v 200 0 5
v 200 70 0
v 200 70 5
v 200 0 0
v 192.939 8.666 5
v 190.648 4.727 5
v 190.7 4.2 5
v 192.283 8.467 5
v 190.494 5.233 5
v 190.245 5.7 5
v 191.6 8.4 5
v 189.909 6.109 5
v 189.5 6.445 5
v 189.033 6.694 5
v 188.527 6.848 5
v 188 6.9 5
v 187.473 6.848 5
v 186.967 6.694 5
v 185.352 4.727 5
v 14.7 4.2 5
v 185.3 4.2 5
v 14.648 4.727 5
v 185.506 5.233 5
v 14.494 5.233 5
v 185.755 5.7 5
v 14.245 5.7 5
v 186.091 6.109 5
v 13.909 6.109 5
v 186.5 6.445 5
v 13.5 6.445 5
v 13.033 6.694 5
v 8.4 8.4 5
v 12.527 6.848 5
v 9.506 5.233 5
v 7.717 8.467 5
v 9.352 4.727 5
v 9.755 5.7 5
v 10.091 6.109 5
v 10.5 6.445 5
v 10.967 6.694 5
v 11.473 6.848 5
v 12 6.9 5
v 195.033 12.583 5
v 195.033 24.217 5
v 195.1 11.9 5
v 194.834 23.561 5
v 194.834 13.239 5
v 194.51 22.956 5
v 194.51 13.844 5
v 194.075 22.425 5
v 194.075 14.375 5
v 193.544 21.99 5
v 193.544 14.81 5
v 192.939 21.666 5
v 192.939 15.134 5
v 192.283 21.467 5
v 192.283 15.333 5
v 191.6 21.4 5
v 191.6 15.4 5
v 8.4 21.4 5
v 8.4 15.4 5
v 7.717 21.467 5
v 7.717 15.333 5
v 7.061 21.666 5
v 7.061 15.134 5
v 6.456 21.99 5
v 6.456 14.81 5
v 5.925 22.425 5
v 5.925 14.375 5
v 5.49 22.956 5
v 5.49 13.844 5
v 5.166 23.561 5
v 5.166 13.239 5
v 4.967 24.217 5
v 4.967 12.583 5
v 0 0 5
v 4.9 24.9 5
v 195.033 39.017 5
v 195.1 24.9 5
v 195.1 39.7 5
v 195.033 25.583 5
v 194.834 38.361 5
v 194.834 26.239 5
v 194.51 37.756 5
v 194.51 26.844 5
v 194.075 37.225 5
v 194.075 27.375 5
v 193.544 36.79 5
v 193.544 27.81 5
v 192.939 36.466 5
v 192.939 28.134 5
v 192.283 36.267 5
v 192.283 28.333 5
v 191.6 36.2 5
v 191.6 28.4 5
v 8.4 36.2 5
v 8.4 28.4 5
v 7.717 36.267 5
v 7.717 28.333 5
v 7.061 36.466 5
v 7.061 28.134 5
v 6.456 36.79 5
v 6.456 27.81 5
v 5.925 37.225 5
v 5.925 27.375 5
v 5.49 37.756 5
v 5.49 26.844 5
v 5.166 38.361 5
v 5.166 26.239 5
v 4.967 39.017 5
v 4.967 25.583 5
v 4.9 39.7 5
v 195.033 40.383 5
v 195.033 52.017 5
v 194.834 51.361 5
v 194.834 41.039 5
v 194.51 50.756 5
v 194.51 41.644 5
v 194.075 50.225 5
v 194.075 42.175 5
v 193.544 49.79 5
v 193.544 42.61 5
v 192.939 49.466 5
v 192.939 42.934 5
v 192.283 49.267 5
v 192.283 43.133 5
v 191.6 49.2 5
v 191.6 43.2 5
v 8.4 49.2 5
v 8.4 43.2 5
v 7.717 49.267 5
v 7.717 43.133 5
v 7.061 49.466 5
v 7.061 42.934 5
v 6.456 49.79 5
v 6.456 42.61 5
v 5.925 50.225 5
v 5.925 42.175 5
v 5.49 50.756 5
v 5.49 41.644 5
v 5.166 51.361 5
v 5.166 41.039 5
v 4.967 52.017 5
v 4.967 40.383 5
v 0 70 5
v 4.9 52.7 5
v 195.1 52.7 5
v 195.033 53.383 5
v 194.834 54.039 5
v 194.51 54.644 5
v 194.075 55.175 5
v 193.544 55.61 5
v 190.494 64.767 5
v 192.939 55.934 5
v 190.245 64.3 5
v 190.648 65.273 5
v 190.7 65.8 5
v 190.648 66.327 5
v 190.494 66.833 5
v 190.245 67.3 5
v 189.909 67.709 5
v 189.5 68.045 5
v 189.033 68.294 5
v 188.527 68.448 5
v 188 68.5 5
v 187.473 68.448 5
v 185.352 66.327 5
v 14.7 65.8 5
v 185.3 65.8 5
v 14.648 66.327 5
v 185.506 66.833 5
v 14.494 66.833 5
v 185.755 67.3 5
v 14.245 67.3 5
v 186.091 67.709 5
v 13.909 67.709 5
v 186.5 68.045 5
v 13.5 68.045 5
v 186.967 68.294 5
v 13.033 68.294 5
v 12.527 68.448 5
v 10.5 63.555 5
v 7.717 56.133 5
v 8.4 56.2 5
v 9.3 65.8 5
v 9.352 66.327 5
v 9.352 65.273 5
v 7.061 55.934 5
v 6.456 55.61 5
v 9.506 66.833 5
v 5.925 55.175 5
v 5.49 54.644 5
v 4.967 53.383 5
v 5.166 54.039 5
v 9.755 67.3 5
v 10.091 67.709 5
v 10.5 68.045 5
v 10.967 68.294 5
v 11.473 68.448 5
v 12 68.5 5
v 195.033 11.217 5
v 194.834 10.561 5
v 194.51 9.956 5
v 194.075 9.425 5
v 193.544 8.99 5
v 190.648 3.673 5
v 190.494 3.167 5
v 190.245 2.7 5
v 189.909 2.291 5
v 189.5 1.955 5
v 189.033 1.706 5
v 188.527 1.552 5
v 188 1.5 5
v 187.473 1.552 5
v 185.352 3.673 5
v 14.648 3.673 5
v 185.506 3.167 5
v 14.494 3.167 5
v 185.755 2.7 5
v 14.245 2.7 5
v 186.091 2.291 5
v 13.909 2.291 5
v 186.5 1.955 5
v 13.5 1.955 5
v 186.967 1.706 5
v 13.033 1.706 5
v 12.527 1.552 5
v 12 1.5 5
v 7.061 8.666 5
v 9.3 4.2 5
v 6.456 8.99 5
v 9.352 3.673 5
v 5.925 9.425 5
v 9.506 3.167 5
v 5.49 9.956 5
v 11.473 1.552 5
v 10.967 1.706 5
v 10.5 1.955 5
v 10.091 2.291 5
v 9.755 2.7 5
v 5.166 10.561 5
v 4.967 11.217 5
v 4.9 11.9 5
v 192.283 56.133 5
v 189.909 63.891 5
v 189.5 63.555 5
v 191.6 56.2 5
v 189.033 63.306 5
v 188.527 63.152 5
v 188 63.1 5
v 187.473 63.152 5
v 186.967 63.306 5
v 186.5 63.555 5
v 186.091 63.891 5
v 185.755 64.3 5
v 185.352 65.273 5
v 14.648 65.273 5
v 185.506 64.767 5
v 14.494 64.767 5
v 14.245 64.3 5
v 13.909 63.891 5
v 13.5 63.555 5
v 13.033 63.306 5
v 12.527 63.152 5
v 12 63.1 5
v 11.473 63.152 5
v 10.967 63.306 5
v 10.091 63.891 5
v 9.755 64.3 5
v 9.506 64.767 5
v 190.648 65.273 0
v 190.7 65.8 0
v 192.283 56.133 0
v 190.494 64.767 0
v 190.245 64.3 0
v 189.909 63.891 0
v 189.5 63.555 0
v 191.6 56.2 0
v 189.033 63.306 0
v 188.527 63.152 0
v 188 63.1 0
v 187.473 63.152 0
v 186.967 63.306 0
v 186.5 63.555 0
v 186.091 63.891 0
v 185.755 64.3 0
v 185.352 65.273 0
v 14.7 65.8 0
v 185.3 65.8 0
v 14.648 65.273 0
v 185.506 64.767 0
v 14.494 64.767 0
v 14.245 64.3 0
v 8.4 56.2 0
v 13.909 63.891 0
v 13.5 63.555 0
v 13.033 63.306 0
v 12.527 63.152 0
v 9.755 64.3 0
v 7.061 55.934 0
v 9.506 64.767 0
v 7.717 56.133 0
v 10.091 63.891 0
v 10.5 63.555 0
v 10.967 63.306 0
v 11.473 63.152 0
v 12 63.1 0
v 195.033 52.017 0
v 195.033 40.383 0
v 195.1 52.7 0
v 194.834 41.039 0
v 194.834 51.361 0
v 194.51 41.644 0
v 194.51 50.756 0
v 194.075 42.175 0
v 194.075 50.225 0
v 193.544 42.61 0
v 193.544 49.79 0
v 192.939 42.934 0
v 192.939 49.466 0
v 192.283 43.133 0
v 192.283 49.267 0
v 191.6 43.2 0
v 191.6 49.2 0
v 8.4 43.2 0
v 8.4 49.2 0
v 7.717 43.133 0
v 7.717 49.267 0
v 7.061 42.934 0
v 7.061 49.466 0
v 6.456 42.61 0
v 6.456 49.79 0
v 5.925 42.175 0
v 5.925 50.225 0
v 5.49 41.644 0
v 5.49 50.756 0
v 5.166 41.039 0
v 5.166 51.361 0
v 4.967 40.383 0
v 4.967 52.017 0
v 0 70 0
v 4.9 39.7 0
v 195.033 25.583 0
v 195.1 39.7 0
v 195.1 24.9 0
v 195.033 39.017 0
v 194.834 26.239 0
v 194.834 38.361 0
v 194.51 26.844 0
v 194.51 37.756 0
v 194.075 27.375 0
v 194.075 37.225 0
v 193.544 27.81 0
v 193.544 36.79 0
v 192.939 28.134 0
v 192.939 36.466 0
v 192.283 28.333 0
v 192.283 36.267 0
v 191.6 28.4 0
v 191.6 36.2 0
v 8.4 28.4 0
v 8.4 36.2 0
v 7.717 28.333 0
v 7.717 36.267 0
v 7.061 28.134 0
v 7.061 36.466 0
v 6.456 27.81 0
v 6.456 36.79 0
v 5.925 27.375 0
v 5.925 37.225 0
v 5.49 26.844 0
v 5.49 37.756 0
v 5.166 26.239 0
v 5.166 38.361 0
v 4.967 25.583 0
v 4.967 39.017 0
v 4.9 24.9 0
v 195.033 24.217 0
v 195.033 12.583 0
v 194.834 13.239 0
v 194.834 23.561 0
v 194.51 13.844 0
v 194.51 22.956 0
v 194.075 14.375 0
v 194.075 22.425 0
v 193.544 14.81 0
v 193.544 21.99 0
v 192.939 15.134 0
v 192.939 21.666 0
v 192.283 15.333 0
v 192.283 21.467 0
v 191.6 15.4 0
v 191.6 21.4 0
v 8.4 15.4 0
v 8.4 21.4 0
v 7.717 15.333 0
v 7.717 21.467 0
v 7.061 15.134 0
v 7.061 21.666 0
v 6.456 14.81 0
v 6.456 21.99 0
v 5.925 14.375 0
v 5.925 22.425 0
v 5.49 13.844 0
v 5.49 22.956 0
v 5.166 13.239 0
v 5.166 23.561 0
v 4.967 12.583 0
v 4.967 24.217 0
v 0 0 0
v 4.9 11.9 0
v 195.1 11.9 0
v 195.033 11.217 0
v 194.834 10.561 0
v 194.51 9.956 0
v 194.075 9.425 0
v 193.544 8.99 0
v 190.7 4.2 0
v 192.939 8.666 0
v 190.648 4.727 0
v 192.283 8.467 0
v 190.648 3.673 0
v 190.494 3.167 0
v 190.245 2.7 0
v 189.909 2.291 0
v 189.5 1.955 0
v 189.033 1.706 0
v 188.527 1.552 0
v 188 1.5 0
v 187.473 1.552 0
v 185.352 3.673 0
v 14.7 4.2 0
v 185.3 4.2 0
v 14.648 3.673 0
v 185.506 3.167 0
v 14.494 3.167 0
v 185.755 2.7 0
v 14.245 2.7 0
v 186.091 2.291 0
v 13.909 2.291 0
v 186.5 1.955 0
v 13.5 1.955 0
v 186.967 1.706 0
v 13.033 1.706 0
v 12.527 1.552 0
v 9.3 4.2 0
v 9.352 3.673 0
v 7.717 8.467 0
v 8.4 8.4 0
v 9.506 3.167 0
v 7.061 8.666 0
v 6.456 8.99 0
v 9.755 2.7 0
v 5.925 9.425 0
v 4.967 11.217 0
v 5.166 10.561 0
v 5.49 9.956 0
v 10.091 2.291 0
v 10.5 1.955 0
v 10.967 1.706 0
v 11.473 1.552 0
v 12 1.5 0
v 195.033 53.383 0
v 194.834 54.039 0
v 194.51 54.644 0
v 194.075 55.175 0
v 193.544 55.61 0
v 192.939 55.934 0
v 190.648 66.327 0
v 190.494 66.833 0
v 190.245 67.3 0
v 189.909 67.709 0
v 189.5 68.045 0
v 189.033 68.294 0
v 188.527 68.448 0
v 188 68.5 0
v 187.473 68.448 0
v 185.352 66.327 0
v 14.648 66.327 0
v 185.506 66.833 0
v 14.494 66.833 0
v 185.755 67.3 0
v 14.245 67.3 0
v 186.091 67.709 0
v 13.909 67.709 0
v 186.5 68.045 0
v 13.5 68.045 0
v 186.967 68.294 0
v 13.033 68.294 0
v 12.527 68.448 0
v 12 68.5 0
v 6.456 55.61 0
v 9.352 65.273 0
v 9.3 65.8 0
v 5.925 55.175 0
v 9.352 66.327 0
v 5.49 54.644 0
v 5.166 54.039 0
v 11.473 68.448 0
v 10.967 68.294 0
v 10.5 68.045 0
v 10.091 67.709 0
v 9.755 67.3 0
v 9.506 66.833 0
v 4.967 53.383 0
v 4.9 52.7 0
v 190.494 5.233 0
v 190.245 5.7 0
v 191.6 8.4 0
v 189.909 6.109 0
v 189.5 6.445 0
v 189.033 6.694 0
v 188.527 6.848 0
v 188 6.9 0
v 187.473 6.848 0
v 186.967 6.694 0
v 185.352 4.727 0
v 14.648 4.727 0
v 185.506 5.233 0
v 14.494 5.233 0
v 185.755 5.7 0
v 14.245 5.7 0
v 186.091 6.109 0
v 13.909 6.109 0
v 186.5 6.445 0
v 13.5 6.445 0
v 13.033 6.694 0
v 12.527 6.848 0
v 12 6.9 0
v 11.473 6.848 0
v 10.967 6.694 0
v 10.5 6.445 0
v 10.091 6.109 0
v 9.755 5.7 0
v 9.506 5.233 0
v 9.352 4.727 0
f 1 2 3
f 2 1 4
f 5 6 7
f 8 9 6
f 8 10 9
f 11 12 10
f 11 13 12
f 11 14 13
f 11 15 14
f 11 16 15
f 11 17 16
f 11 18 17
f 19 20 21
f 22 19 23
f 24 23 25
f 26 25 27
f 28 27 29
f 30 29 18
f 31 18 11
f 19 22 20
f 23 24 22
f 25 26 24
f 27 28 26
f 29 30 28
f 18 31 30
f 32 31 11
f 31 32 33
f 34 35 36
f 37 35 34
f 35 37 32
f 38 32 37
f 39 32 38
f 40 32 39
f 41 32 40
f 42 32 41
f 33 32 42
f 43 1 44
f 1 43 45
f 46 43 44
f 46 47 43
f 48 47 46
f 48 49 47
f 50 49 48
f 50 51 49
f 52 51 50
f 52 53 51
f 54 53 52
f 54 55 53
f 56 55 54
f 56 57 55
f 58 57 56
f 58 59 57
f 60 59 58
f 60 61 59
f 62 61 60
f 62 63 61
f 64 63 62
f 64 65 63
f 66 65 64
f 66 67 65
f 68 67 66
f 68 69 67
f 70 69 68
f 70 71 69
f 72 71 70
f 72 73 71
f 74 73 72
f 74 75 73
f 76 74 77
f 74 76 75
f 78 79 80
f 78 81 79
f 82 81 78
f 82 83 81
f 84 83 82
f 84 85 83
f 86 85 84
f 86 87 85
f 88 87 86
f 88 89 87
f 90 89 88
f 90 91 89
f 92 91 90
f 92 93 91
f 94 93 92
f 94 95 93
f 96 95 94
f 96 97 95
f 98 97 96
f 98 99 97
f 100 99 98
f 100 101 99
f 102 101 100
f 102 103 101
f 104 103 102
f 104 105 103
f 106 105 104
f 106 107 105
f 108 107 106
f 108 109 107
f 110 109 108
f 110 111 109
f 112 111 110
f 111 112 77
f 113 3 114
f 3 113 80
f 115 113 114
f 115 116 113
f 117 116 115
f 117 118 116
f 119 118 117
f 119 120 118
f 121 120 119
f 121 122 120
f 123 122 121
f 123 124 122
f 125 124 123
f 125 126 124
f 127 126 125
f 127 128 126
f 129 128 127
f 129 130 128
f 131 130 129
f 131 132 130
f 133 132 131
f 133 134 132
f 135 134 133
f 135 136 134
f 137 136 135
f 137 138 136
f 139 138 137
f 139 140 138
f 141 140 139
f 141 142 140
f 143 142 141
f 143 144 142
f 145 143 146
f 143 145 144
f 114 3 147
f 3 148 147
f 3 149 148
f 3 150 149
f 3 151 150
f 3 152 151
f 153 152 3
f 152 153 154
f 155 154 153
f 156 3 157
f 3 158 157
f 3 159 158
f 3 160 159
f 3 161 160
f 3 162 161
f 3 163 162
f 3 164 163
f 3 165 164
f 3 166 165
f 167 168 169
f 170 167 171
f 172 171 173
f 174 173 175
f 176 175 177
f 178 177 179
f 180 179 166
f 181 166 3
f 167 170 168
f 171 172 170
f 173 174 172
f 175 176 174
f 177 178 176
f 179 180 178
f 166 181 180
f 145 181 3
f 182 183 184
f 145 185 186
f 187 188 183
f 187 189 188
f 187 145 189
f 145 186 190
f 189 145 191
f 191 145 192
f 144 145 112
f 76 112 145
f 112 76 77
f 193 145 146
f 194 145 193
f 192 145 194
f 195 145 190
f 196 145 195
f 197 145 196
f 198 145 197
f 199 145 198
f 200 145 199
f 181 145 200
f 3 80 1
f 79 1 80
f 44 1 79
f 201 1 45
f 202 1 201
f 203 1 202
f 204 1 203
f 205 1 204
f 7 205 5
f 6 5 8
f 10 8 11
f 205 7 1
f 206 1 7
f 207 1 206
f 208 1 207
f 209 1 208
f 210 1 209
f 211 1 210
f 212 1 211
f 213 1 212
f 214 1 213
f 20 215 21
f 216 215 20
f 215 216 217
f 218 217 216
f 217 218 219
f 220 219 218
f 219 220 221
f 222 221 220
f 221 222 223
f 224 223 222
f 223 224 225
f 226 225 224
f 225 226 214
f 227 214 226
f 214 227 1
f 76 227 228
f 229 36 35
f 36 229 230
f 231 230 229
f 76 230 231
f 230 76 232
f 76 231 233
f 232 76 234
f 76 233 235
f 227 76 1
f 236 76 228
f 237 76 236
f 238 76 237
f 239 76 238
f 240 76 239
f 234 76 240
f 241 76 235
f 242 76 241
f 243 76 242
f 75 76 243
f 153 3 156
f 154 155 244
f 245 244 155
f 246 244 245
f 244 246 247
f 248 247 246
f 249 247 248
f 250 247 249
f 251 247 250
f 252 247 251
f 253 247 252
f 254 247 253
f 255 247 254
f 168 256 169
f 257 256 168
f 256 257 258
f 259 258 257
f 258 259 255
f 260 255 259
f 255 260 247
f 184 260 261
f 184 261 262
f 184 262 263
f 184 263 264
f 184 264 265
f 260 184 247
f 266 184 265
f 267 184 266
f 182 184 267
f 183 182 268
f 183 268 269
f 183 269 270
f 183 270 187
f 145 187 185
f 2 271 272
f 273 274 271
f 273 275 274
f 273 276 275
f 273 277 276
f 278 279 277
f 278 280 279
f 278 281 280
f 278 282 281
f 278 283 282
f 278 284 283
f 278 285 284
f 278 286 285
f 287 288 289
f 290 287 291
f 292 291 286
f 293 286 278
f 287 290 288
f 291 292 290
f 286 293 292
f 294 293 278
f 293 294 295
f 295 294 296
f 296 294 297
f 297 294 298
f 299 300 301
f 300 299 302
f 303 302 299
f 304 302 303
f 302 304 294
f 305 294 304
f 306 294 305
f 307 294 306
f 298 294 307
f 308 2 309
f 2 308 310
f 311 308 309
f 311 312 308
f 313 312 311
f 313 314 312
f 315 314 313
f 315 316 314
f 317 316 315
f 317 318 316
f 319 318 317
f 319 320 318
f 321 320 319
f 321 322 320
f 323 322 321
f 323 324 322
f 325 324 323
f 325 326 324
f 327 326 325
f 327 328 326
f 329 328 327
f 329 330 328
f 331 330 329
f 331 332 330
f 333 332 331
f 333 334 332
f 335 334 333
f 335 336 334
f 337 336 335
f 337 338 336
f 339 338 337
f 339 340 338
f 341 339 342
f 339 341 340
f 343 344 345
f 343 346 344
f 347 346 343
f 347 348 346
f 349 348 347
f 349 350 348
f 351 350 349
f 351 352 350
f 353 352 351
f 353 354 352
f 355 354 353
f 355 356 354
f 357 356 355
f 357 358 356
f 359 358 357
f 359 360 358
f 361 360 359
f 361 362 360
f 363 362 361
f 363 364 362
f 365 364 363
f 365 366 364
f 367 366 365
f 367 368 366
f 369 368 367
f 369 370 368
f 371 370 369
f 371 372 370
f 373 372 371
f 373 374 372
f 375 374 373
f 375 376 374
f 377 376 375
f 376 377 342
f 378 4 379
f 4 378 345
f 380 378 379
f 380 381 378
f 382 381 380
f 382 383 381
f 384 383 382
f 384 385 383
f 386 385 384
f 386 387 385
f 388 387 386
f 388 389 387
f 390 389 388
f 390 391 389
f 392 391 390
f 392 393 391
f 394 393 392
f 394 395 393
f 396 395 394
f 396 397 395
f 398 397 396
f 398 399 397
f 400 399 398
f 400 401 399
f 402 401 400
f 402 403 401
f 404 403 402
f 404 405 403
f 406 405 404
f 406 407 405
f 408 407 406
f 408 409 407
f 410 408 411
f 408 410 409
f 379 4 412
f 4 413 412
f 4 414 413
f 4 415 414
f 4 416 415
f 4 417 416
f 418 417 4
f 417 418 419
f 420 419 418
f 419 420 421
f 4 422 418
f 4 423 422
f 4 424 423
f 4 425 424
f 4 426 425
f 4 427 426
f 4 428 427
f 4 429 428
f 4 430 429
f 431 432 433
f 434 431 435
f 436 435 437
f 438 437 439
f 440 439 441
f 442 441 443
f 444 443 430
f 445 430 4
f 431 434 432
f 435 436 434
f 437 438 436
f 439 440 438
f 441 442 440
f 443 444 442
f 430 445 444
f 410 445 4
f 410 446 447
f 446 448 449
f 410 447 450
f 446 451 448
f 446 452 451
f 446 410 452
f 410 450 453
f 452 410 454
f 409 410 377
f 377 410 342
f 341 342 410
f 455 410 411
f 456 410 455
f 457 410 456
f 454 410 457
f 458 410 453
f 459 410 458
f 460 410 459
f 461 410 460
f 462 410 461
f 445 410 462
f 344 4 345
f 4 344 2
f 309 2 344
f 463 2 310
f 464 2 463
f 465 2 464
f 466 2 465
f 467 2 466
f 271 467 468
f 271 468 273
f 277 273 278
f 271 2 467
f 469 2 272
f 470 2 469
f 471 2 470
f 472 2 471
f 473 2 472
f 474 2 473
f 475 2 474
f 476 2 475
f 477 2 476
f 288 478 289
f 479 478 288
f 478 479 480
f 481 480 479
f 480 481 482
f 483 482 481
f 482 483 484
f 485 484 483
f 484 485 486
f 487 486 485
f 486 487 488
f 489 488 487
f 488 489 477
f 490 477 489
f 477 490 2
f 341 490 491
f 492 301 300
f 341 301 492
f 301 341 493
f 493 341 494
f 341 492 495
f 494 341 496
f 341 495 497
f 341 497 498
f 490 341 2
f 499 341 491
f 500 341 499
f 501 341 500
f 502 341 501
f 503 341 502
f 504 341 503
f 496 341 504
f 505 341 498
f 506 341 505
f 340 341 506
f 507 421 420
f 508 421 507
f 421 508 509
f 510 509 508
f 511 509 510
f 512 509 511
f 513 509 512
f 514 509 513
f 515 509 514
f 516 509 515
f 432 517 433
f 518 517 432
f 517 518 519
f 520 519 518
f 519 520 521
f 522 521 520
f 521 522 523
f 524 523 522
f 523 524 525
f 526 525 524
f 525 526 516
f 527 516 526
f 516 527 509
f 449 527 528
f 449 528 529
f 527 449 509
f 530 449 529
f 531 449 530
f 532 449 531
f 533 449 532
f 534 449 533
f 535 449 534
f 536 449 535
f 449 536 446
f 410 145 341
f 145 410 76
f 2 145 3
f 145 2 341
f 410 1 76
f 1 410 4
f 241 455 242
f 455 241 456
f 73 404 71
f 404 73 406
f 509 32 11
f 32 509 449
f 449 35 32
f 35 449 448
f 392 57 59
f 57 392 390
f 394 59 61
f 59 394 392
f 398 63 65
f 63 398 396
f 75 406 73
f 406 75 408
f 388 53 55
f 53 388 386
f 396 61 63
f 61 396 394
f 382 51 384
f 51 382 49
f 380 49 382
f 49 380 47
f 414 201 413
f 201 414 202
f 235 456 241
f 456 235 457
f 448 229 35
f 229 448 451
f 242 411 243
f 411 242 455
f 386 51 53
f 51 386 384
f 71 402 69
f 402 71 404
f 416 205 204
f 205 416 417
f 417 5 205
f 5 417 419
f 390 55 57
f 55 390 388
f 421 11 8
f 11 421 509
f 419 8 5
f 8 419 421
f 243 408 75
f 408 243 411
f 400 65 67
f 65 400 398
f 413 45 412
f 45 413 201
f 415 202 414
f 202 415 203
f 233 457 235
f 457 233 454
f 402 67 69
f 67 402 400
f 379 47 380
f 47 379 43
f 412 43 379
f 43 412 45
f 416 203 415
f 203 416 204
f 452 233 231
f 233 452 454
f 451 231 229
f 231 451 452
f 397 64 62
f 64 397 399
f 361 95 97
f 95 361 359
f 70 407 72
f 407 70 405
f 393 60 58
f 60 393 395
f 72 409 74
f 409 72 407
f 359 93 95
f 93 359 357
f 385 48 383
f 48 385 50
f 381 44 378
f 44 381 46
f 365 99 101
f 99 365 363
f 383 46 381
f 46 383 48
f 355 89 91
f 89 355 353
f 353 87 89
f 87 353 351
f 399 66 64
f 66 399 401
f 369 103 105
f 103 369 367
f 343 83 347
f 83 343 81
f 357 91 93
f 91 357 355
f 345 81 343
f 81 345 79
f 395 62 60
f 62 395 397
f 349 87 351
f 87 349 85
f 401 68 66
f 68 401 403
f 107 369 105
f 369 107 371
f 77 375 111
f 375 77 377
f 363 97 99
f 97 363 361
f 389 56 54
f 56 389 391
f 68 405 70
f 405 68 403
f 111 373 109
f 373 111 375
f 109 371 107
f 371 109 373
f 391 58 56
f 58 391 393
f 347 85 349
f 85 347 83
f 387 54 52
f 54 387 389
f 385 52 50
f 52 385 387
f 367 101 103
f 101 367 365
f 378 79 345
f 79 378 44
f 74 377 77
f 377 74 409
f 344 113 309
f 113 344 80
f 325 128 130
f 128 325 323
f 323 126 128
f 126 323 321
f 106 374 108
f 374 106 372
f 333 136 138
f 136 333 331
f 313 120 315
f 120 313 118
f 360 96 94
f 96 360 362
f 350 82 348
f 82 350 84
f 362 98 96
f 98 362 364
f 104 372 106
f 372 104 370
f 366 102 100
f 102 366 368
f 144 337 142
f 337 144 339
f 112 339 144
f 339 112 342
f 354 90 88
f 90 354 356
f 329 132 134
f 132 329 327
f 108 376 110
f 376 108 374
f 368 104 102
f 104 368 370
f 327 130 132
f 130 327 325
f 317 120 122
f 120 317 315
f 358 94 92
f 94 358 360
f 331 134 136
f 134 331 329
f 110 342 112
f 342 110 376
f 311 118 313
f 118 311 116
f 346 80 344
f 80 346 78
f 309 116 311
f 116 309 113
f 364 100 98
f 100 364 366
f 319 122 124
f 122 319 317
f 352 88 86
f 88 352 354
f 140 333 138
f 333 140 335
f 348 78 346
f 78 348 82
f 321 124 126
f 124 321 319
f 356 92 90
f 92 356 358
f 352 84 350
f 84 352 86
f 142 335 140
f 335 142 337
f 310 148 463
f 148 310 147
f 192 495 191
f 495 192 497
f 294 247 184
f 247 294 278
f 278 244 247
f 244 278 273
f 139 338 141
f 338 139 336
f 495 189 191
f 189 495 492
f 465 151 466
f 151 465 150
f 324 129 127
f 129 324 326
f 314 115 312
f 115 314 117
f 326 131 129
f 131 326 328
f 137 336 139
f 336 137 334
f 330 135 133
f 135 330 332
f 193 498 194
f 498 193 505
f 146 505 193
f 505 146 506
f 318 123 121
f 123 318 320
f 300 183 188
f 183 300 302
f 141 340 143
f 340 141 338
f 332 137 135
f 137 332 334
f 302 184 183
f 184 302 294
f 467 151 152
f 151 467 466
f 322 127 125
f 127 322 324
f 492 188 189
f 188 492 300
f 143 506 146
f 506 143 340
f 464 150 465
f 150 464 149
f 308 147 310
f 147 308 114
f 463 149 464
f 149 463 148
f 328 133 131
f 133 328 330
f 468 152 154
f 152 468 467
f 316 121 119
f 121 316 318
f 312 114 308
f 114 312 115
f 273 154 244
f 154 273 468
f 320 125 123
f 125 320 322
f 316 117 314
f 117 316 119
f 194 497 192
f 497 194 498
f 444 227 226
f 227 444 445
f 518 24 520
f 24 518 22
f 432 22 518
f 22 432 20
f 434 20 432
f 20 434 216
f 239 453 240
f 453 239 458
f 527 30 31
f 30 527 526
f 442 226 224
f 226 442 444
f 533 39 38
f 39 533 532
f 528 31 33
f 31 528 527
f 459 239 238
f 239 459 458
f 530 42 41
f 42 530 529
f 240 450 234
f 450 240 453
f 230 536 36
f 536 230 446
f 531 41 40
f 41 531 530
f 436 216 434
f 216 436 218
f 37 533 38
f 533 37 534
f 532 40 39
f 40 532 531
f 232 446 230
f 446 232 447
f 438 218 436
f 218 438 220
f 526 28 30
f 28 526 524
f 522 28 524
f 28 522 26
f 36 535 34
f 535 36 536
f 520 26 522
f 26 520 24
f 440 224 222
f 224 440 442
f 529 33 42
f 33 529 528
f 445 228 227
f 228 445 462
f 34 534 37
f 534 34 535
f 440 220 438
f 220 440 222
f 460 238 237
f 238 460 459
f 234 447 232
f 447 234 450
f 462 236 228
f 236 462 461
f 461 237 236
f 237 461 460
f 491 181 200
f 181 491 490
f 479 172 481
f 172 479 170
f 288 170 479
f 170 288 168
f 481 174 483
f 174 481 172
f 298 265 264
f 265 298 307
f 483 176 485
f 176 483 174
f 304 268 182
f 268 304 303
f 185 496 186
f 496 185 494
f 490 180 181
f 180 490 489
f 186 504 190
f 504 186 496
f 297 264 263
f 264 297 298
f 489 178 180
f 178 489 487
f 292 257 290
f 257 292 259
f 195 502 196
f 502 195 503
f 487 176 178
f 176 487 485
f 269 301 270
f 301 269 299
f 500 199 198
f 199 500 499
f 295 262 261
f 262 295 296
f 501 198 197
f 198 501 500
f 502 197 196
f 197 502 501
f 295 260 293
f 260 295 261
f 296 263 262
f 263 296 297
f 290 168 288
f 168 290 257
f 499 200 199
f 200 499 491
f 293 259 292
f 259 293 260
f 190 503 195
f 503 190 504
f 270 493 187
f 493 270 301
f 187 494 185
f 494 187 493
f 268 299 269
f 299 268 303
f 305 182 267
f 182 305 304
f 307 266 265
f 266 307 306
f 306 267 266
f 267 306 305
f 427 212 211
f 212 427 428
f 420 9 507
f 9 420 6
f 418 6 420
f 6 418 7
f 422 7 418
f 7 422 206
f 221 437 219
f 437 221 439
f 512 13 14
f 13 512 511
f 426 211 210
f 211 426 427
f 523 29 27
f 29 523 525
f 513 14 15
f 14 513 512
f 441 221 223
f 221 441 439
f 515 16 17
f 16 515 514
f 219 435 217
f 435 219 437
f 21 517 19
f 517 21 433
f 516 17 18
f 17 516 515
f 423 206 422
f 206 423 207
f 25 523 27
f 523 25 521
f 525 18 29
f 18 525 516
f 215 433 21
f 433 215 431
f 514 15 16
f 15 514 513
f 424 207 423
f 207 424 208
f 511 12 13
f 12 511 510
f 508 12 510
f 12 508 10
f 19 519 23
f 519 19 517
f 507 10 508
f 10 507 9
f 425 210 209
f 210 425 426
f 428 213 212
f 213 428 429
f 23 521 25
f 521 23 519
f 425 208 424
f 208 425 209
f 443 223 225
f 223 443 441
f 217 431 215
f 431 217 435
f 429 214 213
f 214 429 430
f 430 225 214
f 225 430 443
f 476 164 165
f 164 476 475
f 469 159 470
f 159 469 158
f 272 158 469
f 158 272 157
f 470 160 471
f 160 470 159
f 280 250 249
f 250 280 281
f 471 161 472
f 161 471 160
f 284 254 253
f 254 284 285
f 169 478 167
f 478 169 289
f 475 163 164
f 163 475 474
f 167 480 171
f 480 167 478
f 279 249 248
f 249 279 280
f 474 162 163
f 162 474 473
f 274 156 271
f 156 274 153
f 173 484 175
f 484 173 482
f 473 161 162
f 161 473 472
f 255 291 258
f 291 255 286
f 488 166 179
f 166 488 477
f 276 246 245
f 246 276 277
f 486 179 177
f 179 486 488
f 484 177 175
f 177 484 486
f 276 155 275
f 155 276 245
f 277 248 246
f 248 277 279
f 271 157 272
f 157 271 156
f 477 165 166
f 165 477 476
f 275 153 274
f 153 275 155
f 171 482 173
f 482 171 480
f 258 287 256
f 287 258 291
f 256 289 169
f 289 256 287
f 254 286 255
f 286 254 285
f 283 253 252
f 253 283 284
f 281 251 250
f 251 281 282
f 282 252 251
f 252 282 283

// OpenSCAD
$fn = 32;

// ----------------------------------------------------------------------
// Slotted panel: 200 x 70 mm, 4 ряда of slots
// ----------------------------------------------------------------------

// --- parameters (mm) ---
panel_w = 200;            // panel width
panel_d = 70;             // panel depth
thick = 5;                // panel thickness
slot_w = 7;               // slot width
pitch0 = 13;              // first row pitch
pitch_step = 1.8;         // pitch increase per row
margin = 8.4;             // margin around the slot field
rows = 4;                 // number of slot rows
mount_d = 5.4;            // mounting holes
mount_x = 88;             // mounting hole offset

difference() {
  union() {
    cube([panel_w, panel_d, thick]);
  }
  /* slot rows: stadium shaped cutters, 2.5 mm clear of both faces */
  /* row 0: pitch 13, length 183.2 */
  hull() {
    translate([8.4, 11.9, -2.5]) cylinder(h = thick + 5, d = slot_w);
    translate([191.6, 11.9, -2.5]) cylinder(h = thick + 5, d = slot_w);
  }
  /* row 1: pitch 14.8, length 183.2 */
  hull() {
    translate([8.4, 24.9, -2.5]) cylinder(h = thick + 5, d = slot_w);
    translate([191.6, 24.9, -2.5]) cylinder(h = thick + 5, d = slot_w);
  }
  /* row 2: pitch 13, length 183.2 */
  hull() {
    translate([8.4, 39.7, -2.5]) cylinder(h = thick + 5, d = slot_w);
    translate([191.6, 39.7, -2.5]) cylinder(h = thick + 5, d = slot_w);
  }
  /* row 3: pitch 14.8, length 183.2 */
  hull() {
    translate([8.4, 52.7, -2.5]) cylinder(h = thick + 5, d = slot_w);
    translate([191.6, 52.7, -2.5]) cylinder(h = thick + 5, d = slot_w);
  }
  translate([12, 4.2, -2.5]) cylinder(h = 10, d = mount_d);
  translate([12, 65.8, -2.5]) cylinder(h = 10, d = mount_d);
  translate([188, 4.2, -2.5]) cylinder(h = 10, d = mount_d);
  translate([188, 65.8, -2.5]) cylinder(h = 10, d = mount_d);
}
